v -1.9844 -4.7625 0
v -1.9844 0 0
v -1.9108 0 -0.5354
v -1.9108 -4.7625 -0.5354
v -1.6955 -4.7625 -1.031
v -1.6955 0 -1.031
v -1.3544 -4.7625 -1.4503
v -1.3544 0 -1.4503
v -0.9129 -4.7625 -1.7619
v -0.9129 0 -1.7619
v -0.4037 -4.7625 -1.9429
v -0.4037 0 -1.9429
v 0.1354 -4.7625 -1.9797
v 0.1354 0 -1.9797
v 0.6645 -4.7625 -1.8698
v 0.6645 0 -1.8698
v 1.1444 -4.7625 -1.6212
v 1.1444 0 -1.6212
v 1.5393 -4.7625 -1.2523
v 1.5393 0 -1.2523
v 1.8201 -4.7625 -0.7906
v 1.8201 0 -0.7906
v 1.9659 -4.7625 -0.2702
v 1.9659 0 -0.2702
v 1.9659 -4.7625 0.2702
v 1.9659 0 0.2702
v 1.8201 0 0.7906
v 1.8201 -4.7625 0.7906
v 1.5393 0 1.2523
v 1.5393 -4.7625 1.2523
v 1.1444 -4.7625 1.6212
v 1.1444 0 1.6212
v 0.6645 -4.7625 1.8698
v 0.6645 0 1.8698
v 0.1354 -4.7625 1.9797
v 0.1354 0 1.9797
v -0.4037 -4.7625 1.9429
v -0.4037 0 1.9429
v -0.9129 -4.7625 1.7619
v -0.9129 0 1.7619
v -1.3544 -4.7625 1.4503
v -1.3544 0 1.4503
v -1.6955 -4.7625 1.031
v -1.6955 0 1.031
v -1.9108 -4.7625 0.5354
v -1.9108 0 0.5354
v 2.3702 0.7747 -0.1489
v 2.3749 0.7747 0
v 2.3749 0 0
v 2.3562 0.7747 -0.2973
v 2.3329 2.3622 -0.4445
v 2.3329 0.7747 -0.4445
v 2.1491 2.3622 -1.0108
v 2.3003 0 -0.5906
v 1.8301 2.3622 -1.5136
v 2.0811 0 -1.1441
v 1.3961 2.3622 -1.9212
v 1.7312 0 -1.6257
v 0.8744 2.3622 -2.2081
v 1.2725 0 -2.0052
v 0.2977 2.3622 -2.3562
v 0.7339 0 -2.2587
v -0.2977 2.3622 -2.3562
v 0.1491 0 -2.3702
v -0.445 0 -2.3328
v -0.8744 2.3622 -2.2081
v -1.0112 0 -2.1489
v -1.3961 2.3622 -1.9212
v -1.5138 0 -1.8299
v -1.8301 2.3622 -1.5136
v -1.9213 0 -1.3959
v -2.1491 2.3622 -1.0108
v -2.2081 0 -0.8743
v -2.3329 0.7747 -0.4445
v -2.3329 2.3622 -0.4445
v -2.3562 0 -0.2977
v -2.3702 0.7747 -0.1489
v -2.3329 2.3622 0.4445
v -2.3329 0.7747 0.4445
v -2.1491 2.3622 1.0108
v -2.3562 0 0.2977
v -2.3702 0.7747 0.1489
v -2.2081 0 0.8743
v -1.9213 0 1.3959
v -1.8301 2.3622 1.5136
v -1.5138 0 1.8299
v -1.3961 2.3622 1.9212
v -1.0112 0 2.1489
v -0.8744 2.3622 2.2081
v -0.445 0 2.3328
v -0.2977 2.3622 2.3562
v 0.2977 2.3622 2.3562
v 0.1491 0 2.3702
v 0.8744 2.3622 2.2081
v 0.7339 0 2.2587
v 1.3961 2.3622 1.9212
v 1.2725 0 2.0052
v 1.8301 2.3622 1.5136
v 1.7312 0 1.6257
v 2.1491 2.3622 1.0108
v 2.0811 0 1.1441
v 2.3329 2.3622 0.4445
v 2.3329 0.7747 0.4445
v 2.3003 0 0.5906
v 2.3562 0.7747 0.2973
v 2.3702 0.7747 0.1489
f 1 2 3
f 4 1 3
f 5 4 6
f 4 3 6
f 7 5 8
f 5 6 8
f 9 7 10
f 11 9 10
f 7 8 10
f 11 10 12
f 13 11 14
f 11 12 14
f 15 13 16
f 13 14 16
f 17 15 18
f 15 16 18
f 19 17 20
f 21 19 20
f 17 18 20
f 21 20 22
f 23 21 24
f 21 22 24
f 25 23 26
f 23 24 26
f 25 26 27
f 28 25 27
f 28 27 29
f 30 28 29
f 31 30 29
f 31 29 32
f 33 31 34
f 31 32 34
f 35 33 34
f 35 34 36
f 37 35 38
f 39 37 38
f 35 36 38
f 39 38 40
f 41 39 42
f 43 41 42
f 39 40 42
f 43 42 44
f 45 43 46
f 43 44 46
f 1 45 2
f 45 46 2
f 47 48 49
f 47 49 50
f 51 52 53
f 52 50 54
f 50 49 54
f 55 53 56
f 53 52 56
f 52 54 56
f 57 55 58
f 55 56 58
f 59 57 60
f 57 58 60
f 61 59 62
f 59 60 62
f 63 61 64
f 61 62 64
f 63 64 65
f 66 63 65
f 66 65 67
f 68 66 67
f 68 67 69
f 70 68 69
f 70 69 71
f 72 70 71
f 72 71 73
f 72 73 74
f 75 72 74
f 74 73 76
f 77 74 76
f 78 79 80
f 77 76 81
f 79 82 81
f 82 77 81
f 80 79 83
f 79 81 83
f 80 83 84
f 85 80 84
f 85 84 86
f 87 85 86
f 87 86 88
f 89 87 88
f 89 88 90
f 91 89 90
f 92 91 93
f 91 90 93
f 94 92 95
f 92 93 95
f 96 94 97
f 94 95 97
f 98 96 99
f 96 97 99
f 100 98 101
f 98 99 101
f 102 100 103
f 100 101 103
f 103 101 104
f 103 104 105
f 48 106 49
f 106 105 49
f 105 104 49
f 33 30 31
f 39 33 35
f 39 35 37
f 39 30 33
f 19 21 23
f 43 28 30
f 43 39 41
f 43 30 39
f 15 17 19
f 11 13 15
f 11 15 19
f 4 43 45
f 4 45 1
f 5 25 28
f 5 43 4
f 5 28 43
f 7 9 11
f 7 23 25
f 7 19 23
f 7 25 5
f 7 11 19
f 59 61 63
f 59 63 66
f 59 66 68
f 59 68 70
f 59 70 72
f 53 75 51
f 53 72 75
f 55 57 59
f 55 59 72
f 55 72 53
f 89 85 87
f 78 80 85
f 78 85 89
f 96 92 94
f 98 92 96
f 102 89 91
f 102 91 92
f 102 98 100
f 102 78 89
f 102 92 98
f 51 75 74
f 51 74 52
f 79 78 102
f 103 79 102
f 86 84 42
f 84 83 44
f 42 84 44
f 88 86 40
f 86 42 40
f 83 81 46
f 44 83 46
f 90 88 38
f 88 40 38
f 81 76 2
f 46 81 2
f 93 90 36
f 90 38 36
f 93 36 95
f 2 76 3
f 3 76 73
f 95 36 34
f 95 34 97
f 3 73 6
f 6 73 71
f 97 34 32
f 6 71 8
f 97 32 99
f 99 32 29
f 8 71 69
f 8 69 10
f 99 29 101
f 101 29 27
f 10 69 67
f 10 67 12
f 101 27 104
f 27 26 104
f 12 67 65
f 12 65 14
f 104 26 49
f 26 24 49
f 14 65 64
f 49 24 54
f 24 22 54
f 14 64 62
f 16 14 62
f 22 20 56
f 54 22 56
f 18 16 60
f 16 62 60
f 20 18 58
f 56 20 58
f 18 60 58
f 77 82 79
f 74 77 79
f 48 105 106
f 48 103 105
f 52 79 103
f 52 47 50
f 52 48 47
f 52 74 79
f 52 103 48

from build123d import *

# Parameters (mm, degrees)
SKETCH1_R           = 2.3749
BOSS_EXTRUDE1_DEPTH = 2.3622
SKETCH2_R           = 1.984375
BOSS_EXTRUDE2_DEPTH = 4.7625
SKETCH3_W           = 4.7498
SKETCH3_H           = 0.889
CUT_EXTRUDE1_DEPTH  = 1.5875


with BuildPart() as part:
    # Sketch1 → Boss-Extrude1 (new body)
    with BuildSketch(Plane(origin=(0, 0, 0), x_dir=(1, 0, 0), z_dir=(0, 1, 0))):
        Circle(SKETCH1_R)
    extrude(amount=BOSS_EXTRUDE1_DEPTH)

    # Sketch2 → Boss-Extrude2 (add)
    with BuildSketch(Plane(origin=(0, 0, 0), x_dir=(-1, 0, 0), z_dir=(0, -1, 0))):
        Circle(SKETCH2_R)
    extrude(amount=BOSS_EXTRUDE2_DEPTH)

    # Sketch3 → Cut-Extrude1 (cut)
    with BuildSketch(Plane(origin=(0, 2.3622, 0), x_dir=(1, 0, 0), z_dir=(0, 1, 0))):
        Rectangle(SKETCH3_W, SKETCH3_H)
    extrude(amount=-CUT_EXTRUDE1_DEPTH, mode=Mode.SUBTRACT)


solid = part.part
